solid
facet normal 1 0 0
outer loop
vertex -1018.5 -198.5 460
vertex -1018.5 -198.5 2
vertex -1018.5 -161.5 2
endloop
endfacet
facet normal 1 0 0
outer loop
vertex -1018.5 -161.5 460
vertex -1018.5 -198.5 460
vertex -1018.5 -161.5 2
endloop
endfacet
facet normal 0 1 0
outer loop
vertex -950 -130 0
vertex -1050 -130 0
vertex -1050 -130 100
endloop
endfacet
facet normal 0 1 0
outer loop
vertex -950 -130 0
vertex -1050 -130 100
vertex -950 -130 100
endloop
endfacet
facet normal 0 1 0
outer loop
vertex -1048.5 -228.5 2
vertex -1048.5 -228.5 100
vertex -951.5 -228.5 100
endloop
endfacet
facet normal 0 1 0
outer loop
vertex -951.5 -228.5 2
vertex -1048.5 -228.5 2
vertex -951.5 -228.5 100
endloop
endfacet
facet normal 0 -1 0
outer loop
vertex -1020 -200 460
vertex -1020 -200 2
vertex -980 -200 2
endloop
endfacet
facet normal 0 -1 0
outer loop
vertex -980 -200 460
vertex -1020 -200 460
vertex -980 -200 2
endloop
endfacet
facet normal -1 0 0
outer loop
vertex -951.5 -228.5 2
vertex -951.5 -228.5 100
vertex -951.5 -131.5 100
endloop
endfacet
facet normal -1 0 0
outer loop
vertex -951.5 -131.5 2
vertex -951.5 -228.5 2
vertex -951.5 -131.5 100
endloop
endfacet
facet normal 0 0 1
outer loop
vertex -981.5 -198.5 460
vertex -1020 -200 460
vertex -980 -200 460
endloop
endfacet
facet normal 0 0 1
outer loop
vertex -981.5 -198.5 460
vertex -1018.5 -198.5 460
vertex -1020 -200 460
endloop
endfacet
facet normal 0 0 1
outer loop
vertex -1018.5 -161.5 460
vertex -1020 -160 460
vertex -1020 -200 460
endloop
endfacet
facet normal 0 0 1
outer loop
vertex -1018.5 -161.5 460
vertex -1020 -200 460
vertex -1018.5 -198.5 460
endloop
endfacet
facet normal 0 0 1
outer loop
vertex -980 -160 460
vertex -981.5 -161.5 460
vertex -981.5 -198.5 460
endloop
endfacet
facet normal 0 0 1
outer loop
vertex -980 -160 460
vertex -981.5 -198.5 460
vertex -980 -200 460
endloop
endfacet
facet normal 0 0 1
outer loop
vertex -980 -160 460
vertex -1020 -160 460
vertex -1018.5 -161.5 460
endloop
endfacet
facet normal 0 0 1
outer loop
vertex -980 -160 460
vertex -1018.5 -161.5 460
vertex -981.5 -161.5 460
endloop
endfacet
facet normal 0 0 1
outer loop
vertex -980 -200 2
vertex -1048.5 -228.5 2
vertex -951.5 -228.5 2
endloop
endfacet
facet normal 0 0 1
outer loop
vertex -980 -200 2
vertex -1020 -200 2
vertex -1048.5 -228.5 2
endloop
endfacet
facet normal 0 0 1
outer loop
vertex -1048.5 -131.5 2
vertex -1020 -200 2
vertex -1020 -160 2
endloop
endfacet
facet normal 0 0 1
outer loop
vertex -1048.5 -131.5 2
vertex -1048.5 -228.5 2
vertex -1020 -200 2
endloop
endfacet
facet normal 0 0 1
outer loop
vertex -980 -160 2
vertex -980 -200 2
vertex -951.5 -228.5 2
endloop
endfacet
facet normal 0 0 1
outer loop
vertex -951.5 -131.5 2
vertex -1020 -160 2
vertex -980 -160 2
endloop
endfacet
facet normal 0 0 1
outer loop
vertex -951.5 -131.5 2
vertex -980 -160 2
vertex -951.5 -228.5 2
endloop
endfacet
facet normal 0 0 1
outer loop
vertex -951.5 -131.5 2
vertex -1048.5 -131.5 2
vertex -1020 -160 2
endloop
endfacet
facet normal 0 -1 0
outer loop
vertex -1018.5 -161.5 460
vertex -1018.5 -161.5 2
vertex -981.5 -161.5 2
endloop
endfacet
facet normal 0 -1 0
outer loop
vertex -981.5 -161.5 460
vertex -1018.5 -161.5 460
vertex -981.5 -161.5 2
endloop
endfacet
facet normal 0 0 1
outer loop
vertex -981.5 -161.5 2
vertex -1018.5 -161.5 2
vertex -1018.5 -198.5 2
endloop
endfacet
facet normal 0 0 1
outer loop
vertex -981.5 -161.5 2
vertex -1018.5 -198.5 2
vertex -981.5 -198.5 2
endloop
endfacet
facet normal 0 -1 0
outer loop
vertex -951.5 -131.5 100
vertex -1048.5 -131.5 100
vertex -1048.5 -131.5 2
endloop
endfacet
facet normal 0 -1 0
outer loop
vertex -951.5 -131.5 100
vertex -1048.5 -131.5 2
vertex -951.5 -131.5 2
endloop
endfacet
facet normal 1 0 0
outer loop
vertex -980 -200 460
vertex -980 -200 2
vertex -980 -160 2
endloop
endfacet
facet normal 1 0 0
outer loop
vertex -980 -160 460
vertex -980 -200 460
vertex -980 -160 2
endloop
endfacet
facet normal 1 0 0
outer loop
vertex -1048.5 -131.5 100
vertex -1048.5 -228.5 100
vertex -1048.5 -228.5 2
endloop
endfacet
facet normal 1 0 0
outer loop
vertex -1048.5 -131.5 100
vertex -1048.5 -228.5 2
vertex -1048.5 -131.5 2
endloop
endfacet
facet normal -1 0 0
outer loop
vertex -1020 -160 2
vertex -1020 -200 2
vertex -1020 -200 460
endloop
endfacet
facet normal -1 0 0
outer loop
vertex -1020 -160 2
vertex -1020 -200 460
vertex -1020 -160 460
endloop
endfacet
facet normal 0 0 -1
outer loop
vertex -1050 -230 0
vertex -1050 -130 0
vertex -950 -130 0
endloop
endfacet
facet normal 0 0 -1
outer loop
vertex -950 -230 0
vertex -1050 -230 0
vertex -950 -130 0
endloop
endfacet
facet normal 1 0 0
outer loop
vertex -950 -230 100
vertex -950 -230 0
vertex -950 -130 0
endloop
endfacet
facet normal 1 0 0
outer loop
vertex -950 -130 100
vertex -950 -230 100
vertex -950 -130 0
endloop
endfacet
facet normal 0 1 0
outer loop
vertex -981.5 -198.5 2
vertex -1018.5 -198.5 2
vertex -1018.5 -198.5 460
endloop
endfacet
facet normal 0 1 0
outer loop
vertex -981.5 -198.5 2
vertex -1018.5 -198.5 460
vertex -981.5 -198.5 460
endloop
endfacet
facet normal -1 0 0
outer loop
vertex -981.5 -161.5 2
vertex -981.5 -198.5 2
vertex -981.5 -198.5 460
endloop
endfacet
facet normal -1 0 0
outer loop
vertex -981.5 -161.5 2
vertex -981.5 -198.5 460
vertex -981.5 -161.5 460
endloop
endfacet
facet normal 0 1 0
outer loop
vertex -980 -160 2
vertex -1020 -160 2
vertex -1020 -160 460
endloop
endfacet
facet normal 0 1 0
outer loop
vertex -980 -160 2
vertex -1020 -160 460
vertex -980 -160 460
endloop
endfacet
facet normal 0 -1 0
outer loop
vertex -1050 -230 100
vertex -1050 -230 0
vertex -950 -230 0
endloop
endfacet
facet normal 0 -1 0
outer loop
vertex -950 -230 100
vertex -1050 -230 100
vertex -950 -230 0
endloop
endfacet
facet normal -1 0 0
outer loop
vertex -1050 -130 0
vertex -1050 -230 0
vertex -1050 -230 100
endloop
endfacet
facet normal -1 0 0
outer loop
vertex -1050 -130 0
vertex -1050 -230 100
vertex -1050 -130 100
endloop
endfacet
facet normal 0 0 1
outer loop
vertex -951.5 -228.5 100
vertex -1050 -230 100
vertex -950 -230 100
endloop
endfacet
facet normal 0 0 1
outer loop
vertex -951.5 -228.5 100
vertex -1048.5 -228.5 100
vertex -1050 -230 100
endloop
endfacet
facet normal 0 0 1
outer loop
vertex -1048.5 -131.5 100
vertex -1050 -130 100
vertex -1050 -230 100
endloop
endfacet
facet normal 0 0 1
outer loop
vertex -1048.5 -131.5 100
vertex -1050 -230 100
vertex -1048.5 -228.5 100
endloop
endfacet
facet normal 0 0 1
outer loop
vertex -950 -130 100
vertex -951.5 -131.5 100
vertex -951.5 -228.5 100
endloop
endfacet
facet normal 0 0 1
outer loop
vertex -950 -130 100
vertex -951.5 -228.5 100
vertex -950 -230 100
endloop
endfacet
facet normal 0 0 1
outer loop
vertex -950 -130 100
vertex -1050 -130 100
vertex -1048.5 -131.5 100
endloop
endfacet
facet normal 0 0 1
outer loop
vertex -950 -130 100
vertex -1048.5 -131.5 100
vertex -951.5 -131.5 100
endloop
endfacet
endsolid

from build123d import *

# Parameters (mm, degrees)
SKETCH004_W   = 100
SKETCH004_H   = 100
PAD002_DEPTH  = 2
SKETCH005_W   = 40
SKETCH005_H   = 40
SKETCH005_W_2 = 37
SKETCH005_H_2 = 37
PAD003_DEPTH  = 458
SKETCH006_W   = 100
SKETCH006_H   = 100
SKETCH006_W_2 = 97
SKETCH006_H_2 = 97
PAD004_DEPTH  = 100


with BuildPart() as part:
    # Sketch004 → Pad002 (new body)
    with BuildSketch(Plane.XY):
        with Locations((-1000, -180)):
            Rectangle(SKETCH004_W, SKETCH004_H)
    extrude(amount=PAD002_DEPTH)

    # Sketch005 (on Face6 of Pad002) → Pad003 (join)
    with BuildSketch(Plane.XY.offset(2)):
        with Locations((-1000, -180)):
            Rectangle(SKETCH005_W, SKETCH005_H)
        with Locations((-1000, -180)):
            Rectangle(SKETCH005_W_2, SKETCH005_H_2, mode=Mode.SUBTRACT)
    extrude(amount=PAD003_DEPTH)

    # Sketch006 → Pad004 (join)
    with BuildSketch(Plane.XY):
        with Locations((-1000, -180)):
            Rectangle(SKETCH006_W, SKETCH006_H)
        with Locations((-1000, -180)):
            Rectangle(SKETCH006_W_2, SKETCH006_H_2, mode=Mode.SUBTRACT)
    extrude(amount=PAD004_DEPTH)


solid = part.part
